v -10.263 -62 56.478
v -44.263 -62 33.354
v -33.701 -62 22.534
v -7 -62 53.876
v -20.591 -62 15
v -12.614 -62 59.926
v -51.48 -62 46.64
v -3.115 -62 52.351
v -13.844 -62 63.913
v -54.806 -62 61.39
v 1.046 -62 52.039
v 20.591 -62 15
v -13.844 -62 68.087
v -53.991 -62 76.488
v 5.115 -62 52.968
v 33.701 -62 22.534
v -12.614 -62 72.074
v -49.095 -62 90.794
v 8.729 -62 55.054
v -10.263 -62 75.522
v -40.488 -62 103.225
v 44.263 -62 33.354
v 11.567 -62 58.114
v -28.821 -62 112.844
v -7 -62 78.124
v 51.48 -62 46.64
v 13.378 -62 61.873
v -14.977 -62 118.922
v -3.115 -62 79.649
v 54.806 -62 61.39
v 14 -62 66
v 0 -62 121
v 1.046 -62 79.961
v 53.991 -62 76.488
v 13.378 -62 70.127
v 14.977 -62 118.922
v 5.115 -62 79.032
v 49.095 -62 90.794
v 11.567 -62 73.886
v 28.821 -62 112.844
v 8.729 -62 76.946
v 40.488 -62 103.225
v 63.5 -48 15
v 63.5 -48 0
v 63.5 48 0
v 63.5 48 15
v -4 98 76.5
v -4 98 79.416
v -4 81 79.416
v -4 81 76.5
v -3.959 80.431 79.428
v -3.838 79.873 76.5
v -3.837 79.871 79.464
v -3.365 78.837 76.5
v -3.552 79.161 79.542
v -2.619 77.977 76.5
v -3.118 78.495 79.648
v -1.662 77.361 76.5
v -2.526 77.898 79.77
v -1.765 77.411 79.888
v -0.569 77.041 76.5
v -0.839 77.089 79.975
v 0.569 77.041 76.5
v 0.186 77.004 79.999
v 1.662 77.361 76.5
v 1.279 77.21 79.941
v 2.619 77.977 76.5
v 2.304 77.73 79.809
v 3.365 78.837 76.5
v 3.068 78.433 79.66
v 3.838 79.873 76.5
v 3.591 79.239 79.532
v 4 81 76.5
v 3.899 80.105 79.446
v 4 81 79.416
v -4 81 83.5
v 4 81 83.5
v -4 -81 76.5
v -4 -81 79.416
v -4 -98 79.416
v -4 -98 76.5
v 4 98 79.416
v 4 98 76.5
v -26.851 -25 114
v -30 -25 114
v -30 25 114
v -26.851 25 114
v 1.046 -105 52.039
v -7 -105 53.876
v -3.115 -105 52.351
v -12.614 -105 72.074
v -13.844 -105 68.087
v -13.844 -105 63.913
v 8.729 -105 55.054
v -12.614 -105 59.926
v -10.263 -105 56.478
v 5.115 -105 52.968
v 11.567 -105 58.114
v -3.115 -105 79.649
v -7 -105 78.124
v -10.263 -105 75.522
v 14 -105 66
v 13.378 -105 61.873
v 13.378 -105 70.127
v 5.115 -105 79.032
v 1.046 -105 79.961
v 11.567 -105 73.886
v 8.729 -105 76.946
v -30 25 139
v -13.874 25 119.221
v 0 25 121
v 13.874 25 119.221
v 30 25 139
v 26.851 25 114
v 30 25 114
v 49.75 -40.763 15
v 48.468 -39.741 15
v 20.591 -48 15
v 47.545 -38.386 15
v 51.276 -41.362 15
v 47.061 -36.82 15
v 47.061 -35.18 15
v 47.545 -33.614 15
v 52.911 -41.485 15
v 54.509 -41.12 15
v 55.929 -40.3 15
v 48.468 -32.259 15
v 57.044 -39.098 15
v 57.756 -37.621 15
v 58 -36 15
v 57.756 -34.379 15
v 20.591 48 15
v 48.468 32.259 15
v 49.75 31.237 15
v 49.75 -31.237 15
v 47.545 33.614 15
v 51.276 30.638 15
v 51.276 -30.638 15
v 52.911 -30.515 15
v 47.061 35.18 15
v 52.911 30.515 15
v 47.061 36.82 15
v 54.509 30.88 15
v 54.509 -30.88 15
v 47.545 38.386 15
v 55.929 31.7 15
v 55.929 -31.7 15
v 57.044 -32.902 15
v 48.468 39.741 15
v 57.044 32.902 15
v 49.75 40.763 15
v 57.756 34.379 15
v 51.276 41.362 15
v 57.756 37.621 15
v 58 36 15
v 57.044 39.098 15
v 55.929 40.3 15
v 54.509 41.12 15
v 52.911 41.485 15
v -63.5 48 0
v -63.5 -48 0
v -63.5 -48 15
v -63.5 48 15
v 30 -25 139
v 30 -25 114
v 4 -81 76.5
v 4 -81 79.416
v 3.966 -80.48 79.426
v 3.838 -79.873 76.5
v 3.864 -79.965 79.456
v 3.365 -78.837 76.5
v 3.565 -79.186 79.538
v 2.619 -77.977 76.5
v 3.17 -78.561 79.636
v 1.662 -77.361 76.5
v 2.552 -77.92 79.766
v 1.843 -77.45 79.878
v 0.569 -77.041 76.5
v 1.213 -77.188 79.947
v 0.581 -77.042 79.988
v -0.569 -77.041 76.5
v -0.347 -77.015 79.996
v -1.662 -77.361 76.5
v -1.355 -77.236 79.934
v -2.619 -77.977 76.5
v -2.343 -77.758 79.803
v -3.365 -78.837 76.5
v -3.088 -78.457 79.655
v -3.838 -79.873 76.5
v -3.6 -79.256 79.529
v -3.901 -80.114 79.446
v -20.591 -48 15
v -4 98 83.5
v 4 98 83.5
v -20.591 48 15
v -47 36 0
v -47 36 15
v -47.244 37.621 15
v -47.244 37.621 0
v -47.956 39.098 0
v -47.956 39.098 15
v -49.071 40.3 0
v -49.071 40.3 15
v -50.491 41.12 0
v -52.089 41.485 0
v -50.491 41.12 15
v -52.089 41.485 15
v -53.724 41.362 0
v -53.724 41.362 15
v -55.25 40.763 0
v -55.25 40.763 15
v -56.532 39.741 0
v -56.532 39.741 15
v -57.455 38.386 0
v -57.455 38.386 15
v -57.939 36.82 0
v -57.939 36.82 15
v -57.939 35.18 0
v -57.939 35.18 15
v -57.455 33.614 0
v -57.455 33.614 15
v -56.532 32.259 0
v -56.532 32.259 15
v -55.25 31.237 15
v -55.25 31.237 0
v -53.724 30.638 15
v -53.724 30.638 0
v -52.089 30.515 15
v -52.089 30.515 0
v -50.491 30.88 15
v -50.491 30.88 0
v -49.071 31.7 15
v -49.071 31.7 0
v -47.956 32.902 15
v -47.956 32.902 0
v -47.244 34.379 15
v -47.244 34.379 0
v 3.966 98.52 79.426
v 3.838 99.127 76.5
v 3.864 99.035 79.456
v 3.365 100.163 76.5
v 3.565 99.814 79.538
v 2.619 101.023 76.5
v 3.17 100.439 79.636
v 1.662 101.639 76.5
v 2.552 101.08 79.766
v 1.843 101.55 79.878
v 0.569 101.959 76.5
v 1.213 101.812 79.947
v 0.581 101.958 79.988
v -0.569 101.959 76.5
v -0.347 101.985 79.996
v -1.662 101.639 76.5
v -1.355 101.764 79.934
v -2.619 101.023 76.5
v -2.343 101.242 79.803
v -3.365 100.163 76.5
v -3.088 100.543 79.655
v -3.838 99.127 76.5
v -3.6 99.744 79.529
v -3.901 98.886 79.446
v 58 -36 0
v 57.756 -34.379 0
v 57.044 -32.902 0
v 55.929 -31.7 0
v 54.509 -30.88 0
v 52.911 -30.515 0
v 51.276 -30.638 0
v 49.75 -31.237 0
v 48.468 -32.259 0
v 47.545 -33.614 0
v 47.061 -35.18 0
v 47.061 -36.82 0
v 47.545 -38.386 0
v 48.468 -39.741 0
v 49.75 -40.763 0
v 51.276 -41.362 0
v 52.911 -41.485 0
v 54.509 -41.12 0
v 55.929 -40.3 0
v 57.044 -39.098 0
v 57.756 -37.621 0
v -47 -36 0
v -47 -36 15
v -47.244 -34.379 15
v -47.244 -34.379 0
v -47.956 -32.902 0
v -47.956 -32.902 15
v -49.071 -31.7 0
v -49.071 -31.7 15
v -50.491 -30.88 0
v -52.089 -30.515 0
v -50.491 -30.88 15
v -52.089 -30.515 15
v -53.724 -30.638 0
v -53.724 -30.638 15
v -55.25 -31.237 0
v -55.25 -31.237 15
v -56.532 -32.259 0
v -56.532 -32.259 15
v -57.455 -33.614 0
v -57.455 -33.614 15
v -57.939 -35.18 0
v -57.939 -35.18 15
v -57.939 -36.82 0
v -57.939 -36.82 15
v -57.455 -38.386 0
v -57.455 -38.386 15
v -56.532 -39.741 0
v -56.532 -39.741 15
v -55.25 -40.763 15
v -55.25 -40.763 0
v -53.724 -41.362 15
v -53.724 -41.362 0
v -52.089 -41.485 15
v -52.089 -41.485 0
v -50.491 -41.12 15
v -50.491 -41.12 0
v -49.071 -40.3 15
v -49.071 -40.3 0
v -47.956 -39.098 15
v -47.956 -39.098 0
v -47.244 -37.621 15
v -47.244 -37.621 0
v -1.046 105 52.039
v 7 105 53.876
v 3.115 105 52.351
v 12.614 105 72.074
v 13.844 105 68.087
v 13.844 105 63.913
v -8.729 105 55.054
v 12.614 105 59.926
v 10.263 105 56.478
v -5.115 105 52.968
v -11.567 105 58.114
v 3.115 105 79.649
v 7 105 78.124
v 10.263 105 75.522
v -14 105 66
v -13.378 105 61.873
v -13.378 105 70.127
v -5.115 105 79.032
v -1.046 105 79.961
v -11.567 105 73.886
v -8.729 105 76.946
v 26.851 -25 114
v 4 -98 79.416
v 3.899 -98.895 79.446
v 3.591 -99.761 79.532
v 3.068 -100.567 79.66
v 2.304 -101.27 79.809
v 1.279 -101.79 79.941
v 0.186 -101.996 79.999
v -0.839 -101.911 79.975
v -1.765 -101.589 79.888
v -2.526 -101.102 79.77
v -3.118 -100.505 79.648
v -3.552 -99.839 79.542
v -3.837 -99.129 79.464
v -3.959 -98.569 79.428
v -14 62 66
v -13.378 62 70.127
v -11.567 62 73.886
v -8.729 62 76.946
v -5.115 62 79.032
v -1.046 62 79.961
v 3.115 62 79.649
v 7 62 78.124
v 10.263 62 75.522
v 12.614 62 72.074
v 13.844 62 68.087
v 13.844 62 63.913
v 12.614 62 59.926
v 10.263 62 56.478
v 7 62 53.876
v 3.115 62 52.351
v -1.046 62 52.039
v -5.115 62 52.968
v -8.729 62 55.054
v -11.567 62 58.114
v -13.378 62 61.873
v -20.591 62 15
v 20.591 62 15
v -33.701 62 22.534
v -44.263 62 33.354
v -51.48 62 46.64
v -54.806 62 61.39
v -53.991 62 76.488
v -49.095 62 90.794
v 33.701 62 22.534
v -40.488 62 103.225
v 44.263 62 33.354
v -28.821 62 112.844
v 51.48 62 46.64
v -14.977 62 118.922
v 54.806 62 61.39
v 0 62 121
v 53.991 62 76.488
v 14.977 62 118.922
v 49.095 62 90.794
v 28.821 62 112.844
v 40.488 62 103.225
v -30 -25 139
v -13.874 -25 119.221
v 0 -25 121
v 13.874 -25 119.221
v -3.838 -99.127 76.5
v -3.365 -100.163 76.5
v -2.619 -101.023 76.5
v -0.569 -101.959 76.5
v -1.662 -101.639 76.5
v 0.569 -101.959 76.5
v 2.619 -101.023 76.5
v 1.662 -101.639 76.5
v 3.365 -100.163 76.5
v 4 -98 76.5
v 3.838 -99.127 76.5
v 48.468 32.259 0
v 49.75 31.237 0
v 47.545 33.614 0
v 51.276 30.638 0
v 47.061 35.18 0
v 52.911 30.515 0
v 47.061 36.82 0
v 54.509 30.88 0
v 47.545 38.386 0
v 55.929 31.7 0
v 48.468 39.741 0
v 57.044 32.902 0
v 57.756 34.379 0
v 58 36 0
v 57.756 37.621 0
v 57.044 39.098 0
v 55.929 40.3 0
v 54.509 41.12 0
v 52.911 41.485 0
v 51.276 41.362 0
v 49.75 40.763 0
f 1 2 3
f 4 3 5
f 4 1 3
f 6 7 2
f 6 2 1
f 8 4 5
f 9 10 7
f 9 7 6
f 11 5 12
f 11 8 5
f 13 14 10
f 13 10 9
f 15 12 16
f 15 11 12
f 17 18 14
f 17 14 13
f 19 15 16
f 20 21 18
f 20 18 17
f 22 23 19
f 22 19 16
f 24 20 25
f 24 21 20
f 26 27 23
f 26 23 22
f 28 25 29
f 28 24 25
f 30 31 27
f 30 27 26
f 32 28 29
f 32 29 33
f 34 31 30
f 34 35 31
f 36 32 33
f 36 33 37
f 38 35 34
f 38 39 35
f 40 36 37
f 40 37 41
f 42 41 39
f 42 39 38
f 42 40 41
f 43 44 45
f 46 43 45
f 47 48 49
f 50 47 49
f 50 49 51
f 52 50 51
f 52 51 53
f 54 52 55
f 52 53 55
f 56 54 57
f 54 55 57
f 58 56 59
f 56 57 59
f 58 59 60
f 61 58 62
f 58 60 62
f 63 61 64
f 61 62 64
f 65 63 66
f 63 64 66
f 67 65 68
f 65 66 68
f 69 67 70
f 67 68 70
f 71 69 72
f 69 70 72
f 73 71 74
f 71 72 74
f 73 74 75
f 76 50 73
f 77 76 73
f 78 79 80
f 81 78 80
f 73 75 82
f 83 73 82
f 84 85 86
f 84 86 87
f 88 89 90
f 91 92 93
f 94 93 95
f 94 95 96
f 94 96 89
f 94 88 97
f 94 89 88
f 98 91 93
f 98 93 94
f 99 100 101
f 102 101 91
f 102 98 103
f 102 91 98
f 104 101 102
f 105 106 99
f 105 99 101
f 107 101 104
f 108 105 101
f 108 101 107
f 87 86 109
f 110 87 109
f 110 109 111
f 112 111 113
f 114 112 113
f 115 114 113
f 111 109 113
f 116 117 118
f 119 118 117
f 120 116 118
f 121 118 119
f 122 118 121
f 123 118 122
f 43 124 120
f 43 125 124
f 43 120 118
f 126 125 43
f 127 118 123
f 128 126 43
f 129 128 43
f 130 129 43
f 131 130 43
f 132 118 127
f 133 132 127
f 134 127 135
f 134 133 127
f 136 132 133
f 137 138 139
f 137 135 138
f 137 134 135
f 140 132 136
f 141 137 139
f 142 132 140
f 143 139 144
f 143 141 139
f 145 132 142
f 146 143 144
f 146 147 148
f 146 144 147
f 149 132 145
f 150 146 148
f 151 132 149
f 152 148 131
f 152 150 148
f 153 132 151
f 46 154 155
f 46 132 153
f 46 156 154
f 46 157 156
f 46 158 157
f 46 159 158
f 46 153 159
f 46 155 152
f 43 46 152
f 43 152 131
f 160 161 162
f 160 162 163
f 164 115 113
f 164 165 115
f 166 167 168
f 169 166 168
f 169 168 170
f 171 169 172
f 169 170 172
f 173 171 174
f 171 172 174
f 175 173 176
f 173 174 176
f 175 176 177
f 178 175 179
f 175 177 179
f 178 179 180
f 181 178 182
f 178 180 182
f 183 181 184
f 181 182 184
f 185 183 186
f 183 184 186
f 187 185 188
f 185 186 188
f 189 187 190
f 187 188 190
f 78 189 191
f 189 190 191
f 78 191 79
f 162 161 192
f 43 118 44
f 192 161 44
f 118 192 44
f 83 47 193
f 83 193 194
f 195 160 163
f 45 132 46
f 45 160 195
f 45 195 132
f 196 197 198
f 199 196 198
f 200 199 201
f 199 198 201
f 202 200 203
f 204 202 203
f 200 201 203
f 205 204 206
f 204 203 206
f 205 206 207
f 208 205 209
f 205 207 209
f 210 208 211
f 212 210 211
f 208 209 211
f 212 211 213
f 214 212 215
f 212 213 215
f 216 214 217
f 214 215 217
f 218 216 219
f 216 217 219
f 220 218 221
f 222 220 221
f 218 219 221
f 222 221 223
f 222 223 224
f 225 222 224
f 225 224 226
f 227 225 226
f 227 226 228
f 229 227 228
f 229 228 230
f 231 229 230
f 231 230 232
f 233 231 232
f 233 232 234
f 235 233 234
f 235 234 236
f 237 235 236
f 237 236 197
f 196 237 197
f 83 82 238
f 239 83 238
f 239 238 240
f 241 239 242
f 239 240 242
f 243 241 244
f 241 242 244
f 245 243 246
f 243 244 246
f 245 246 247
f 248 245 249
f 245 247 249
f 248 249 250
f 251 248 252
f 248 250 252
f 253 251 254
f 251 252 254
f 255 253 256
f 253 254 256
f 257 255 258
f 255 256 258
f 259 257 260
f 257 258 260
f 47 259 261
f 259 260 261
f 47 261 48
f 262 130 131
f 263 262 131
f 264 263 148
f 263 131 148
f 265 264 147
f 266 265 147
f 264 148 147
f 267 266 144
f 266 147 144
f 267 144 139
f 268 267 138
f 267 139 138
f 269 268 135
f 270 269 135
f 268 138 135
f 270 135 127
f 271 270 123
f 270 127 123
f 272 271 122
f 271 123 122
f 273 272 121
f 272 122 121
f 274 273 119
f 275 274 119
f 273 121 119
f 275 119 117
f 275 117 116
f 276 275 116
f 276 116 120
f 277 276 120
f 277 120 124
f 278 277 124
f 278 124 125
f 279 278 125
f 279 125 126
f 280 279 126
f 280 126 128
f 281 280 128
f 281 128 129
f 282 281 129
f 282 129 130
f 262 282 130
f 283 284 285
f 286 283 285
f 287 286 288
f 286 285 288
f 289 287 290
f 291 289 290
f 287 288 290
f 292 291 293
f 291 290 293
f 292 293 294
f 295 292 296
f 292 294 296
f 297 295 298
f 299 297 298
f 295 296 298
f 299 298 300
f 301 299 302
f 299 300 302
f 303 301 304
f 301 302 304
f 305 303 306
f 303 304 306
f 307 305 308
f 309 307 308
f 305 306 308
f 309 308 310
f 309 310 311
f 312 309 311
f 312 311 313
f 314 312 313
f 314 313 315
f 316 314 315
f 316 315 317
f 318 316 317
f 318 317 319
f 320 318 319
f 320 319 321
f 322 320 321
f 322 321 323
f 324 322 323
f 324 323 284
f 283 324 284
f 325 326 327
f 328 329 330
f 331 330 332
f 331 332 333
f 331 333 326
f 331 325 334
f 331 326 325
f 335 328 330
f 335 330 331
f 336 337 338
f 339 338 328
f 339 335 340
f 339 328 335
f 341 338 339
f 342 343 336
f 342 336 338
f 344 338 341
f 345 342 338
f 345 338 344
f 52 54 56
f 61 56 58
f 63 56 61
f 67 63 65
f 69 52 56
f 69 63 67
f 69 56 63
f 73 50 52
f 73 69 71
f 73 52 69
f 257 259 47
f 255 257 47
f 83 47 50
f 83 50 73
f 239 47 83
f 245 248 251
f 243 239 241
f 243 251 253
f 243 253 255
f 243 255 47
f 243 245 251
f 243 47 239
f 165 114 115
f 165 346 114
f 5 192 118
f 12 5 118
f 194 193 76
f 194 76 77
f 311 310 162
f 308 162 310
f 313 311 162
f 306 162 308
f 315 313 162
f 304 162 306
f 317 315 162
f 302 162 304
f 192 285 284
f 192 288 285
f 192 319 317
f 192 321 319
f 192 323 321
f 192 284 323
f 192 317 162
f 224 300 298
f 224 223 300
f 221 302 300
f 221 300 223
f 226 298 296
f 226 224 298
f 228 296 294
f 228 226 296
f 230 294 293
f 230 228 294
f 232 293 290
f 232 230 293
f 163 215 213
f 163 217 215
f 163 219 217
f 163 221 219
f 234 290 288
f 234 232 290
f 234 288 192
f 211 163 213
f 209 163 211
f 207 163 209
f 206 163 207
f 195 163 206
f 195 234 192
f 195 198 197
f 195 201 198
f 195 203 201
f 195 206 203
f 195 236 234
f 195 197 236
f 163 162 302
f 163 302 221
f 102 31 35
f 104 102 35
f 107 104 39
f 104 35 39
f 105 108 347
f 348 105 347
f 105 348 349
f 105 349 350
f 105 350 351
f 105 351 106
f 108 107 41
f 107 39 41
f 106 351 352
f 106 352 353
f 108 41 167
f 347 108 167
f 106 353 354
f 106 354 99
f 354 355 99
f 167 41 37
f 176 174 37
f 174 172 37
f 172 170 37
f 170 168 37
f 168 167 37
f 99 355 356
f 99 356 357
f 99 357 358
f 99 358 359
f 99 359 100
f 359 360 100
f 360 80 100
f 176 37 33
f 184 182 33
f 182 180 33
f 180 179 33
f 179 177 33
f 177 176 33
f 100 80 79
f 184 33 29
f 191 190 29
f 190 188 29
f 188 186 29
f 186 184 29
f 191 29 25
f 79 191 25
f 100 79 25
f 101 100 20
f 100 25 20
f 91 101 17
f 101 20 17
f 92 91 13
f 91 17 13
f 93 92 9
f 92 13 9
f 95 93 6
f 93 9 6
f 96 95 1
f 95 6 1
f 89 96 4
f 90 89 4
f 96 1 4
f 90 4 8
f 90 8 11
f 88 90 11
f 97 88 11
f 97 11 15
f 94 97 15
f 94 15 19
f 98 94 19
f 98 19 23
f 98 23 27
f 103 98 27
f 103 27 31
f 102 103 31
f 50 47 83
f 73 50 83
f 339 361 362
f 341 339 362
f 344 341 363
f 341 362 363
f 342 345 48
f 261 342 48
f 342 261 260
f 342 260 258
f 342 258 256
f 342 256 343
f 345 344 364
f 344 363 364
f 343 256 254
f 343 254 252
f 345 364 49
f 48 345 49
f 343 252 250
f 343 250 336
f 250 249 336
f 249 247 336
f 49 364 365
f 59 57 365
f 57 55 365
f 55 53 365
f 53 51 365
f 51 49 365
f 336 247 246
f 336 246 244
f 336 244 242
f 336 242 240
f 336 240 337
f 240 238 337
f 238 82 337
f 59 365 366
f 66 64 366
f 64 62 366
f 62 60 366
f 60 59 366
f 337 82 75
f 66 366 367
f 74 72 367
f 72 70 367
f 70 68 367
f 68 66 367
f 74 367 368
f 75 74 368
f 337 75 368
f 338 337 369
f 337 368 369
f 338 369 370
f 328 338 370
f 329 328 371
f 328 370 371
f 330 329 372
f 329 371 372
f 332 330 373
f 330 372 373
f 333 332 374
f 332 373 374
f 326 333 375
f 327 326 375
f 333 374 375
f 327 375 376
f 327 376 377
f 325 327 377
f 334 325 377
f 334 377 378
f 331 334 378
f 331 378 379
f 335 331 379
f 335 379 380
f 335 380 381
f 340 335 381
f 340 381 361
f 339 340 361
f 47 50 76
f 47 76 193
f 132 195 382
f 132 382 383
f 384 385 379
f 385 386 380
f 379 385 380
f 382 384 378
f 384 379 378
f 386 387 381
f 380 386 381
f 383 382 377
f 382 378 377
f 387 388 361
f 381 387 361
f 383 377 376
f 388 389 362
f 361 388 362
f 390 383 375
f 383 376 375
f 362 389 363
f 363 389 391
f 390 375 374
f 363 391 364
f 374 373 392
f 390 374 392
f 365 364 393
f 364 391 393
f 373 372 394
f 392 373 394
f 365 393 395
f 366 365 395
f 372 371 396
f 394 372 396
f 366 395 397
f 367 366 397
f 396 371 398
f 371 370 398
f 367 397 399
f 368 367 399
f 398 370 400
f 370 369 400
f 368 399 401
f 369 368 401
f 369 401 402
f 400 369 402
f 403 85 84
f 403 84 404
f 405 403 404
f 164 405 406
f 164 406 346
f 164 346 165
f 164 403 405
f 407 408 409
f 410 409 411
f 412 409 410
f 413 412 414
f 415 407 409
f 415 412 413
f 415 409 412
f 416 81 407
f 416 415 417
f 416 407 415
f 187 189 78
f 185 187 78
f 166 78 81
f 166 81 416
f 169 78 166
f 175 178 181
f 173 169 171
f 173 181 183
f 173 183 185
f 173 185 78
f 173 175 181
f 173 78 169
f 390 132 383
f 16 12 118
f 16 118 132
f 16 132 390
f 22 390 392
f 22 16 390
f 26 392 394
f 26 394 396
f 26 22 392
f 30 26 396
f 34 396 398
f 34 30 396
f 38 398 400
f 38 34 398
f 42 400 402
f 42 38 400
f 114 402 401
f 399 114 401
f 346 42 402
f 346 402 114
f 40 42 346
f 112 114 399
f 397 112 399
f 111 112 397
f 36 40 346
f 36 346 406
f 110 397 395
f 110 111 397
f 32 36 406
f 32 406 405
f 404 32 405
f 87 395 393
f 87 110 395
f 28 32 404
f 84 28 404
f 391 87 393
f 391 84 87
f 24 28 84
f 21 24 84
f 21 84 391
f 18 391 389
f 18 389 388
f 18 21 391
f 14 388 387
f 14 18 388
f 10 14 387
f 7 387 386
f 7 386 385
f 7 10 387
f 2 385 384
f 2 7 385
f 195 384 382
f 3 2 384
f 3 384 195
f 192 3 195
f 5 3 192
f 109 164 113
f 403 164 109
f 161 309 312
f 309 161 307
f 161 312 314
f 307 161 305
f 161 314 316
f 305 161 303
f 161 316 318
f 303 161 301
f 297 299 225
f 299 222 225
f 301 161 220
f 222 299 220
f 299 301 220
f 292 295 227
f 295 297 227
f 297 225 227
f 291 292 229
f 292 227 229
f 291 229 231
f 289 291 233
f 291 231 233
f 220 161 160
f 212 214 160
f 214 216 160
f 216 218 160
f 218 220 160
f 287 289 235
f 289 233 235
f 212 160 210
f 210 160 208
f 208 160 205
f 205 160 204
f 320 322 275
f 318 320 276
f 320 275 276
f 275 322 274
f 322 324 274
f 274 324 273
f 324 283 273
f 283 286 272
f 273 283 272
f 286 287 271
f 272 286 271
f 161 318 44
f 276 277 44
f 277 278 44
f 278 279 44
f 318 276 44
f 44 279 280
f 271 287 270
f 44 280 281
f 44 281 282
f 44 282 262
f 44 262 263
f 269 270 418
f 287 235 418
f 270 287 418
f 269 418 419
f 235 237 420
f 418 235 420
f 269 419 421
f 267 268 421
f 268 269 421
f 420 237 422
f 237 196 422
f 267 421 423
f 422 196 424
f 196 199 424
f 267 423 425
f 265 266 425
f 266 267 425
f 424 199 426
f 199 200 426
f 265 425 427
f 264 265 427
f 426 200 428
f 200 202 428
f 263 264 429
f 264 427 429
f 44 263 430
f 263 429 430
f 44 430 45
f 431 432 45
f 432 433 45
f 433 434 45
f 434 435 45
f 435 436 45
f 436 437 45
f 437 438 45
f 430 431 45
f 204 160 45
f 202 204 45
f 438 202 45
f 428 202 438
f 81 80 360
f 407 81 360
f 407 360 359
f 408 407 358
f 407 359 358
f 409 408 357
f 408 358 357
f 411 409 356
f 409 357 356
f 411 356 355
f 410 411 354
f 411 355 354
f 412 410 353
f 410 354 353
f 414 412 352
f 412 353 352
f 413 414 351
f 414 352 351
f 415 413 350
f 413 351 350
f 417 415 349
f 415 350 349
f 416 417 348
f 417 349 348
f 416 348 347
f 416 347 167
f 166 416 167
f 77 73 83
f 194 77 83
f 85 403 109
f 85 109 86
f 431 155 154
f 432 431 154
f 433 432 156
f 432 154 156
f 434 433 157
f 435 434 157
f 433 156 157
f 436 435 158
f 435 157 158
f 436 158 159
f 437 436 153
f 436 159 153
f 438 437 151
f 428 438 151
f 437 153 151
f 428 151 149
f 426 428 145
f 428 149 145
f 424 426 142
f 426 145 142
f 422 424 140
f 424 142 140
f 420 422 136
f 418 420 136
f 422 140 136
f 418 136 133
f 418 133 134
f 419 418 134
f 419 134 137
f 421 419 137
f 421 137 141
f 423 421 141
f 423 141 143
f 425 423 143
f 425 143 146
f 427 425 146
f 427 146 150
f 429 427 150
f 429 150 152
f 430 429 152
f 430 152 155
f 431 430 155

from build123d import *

# Parameters (mm, degrees)
F0_W           = 127
F0_H           = 96
F1_DEPTH       = 15
F3_DEPTH       = 62
F3_DEPTH_BACK  = 62
F4_R           = 14
F5_DEPTH       = 43
F6_R           = 14
F7_DEPTH       = 43
F10_DEPTH      = 3.5
F12_D          = 11
F12_DEPTH      = 15.001
F14_DEPTH      = 25
F14_DEPTH_BACK = 25
F15_W          = 8
F15_H          = 17
F16_DEPTH      = 7
F17_W          = 8
F17_H          = 17
F18_DEPTH      = 7


with BuildPart() as f1:
    # F0 (on Top) → F1 (new body)
    with BuildSketch(Plane.XY):
        Rectangle(F0_W, F0_H)
    extrude(amount=F1_DEPTH)

    # F2 (on Front) → F3 (join, two sides)
    with BuildSketch(Plane.XZ) as f3_sk:
        with BuildLine():
            Line((-20.591260282, 15), (20.591260282, 15))
            ThreePointArc((20.591260282, 15), (0, 121), (-20.591260282, 15))
        make_face()
    extrude(amount=F3_DEPTH)
    extrude(f3_sk.sketch, amount=-F3_DEPTH_BACK)

    # F4 (on face) → F5 (join)
    with BuildSketch(Plane(origin=(0, 62, 0), x_dir=(-1, 0, 0), z_dir=(0, 1, 0))):
        with Locations((0, 66)):
            Circle(F4_R)
    extrude(amount=F5_DEPTH)

    # F6 (on face) → F7 (join)
    with BuildSketch(Plane.XZ.offset(62)):
        with Locations((0, 66)):
            Circle(F6_R)
    extrude(amount=F7_DEPTH)

    # F9 (on offset) → F10 (cut)
    with BuildSketch(Plane.XY.offset(80)):
        with BuildLine():
            ThreePointArc((4, 98), (0, 102), (-4, 98))
            Line((-4, 98), (-4, 81))
            ThreePointArc((-4, 81), (0, 77), (4, 81))
            Line((4, 81), (4, 98))
        make_face()
        with BuildLine():
            ThreePointArc((4, -81), (0, -77), (-4, -81))
            Line((-4, -81), (-4, -98))
            ThreePointArc((-4, -98), (0, -102), (4, -98))
            Line((4, -98), (4, -81))
        make_face()
    extrude(amount=-F10_DEPTH, mode=Mode.SUBTRACT)

    # F12 (through all, one way)
    with BuildSketch(Plane.XY.offset(15)):
        with Locations((52.5, 36), (52.5, -36), (-52.5, -36), (-52.5, 36)):
            Circle(F12_D / 2)
    extrude(amount=-F12_DEPTH, mode=Mode.SUBTRACT)

    # F13 (on Front) → F14 (join, two sides)
    with BuildSketch(Plane.XZ) as f14_sk:
        with BuildLine():
            Line((30, 139), (-30, 139))
            Line((-30, 139), (-30, 114))
            Line((-30, 114), (-26.8514431642, 114))
            ThreePointArc((-26.8514431642, 114), (0, 121), (26.8514431642, 114))
            Line((26.8514431642, 114), (30, 114))
            Line((30, 114), (30, 139))
        make_face()
    extrude(amount=F14_DEPTH)
    extrude(f14_sk.sketch, amount=-F14_DEPTH_BACK)


with BuildPart() as f16:
    # F15 (on face) → F16 (new body)
    with BuildSketch(Plane.XY.offset(76.5)):
        with Locations((0, 89.5)):
            Rectangle(F15_W, F15_H)
    extrude(amount=F16_DEPTH)


with BuildPart() as f18:
    # F17 (on face) → F18 (new body)
    with BuildSketch(Plane.XY.offset(76.5)):
        with Locations((0, -89.5)):
            Rectangle(F17_W, F17_H)
    extrude(amount=F18_DEPTH)


solid = Compound([f1.part, f16.part])
